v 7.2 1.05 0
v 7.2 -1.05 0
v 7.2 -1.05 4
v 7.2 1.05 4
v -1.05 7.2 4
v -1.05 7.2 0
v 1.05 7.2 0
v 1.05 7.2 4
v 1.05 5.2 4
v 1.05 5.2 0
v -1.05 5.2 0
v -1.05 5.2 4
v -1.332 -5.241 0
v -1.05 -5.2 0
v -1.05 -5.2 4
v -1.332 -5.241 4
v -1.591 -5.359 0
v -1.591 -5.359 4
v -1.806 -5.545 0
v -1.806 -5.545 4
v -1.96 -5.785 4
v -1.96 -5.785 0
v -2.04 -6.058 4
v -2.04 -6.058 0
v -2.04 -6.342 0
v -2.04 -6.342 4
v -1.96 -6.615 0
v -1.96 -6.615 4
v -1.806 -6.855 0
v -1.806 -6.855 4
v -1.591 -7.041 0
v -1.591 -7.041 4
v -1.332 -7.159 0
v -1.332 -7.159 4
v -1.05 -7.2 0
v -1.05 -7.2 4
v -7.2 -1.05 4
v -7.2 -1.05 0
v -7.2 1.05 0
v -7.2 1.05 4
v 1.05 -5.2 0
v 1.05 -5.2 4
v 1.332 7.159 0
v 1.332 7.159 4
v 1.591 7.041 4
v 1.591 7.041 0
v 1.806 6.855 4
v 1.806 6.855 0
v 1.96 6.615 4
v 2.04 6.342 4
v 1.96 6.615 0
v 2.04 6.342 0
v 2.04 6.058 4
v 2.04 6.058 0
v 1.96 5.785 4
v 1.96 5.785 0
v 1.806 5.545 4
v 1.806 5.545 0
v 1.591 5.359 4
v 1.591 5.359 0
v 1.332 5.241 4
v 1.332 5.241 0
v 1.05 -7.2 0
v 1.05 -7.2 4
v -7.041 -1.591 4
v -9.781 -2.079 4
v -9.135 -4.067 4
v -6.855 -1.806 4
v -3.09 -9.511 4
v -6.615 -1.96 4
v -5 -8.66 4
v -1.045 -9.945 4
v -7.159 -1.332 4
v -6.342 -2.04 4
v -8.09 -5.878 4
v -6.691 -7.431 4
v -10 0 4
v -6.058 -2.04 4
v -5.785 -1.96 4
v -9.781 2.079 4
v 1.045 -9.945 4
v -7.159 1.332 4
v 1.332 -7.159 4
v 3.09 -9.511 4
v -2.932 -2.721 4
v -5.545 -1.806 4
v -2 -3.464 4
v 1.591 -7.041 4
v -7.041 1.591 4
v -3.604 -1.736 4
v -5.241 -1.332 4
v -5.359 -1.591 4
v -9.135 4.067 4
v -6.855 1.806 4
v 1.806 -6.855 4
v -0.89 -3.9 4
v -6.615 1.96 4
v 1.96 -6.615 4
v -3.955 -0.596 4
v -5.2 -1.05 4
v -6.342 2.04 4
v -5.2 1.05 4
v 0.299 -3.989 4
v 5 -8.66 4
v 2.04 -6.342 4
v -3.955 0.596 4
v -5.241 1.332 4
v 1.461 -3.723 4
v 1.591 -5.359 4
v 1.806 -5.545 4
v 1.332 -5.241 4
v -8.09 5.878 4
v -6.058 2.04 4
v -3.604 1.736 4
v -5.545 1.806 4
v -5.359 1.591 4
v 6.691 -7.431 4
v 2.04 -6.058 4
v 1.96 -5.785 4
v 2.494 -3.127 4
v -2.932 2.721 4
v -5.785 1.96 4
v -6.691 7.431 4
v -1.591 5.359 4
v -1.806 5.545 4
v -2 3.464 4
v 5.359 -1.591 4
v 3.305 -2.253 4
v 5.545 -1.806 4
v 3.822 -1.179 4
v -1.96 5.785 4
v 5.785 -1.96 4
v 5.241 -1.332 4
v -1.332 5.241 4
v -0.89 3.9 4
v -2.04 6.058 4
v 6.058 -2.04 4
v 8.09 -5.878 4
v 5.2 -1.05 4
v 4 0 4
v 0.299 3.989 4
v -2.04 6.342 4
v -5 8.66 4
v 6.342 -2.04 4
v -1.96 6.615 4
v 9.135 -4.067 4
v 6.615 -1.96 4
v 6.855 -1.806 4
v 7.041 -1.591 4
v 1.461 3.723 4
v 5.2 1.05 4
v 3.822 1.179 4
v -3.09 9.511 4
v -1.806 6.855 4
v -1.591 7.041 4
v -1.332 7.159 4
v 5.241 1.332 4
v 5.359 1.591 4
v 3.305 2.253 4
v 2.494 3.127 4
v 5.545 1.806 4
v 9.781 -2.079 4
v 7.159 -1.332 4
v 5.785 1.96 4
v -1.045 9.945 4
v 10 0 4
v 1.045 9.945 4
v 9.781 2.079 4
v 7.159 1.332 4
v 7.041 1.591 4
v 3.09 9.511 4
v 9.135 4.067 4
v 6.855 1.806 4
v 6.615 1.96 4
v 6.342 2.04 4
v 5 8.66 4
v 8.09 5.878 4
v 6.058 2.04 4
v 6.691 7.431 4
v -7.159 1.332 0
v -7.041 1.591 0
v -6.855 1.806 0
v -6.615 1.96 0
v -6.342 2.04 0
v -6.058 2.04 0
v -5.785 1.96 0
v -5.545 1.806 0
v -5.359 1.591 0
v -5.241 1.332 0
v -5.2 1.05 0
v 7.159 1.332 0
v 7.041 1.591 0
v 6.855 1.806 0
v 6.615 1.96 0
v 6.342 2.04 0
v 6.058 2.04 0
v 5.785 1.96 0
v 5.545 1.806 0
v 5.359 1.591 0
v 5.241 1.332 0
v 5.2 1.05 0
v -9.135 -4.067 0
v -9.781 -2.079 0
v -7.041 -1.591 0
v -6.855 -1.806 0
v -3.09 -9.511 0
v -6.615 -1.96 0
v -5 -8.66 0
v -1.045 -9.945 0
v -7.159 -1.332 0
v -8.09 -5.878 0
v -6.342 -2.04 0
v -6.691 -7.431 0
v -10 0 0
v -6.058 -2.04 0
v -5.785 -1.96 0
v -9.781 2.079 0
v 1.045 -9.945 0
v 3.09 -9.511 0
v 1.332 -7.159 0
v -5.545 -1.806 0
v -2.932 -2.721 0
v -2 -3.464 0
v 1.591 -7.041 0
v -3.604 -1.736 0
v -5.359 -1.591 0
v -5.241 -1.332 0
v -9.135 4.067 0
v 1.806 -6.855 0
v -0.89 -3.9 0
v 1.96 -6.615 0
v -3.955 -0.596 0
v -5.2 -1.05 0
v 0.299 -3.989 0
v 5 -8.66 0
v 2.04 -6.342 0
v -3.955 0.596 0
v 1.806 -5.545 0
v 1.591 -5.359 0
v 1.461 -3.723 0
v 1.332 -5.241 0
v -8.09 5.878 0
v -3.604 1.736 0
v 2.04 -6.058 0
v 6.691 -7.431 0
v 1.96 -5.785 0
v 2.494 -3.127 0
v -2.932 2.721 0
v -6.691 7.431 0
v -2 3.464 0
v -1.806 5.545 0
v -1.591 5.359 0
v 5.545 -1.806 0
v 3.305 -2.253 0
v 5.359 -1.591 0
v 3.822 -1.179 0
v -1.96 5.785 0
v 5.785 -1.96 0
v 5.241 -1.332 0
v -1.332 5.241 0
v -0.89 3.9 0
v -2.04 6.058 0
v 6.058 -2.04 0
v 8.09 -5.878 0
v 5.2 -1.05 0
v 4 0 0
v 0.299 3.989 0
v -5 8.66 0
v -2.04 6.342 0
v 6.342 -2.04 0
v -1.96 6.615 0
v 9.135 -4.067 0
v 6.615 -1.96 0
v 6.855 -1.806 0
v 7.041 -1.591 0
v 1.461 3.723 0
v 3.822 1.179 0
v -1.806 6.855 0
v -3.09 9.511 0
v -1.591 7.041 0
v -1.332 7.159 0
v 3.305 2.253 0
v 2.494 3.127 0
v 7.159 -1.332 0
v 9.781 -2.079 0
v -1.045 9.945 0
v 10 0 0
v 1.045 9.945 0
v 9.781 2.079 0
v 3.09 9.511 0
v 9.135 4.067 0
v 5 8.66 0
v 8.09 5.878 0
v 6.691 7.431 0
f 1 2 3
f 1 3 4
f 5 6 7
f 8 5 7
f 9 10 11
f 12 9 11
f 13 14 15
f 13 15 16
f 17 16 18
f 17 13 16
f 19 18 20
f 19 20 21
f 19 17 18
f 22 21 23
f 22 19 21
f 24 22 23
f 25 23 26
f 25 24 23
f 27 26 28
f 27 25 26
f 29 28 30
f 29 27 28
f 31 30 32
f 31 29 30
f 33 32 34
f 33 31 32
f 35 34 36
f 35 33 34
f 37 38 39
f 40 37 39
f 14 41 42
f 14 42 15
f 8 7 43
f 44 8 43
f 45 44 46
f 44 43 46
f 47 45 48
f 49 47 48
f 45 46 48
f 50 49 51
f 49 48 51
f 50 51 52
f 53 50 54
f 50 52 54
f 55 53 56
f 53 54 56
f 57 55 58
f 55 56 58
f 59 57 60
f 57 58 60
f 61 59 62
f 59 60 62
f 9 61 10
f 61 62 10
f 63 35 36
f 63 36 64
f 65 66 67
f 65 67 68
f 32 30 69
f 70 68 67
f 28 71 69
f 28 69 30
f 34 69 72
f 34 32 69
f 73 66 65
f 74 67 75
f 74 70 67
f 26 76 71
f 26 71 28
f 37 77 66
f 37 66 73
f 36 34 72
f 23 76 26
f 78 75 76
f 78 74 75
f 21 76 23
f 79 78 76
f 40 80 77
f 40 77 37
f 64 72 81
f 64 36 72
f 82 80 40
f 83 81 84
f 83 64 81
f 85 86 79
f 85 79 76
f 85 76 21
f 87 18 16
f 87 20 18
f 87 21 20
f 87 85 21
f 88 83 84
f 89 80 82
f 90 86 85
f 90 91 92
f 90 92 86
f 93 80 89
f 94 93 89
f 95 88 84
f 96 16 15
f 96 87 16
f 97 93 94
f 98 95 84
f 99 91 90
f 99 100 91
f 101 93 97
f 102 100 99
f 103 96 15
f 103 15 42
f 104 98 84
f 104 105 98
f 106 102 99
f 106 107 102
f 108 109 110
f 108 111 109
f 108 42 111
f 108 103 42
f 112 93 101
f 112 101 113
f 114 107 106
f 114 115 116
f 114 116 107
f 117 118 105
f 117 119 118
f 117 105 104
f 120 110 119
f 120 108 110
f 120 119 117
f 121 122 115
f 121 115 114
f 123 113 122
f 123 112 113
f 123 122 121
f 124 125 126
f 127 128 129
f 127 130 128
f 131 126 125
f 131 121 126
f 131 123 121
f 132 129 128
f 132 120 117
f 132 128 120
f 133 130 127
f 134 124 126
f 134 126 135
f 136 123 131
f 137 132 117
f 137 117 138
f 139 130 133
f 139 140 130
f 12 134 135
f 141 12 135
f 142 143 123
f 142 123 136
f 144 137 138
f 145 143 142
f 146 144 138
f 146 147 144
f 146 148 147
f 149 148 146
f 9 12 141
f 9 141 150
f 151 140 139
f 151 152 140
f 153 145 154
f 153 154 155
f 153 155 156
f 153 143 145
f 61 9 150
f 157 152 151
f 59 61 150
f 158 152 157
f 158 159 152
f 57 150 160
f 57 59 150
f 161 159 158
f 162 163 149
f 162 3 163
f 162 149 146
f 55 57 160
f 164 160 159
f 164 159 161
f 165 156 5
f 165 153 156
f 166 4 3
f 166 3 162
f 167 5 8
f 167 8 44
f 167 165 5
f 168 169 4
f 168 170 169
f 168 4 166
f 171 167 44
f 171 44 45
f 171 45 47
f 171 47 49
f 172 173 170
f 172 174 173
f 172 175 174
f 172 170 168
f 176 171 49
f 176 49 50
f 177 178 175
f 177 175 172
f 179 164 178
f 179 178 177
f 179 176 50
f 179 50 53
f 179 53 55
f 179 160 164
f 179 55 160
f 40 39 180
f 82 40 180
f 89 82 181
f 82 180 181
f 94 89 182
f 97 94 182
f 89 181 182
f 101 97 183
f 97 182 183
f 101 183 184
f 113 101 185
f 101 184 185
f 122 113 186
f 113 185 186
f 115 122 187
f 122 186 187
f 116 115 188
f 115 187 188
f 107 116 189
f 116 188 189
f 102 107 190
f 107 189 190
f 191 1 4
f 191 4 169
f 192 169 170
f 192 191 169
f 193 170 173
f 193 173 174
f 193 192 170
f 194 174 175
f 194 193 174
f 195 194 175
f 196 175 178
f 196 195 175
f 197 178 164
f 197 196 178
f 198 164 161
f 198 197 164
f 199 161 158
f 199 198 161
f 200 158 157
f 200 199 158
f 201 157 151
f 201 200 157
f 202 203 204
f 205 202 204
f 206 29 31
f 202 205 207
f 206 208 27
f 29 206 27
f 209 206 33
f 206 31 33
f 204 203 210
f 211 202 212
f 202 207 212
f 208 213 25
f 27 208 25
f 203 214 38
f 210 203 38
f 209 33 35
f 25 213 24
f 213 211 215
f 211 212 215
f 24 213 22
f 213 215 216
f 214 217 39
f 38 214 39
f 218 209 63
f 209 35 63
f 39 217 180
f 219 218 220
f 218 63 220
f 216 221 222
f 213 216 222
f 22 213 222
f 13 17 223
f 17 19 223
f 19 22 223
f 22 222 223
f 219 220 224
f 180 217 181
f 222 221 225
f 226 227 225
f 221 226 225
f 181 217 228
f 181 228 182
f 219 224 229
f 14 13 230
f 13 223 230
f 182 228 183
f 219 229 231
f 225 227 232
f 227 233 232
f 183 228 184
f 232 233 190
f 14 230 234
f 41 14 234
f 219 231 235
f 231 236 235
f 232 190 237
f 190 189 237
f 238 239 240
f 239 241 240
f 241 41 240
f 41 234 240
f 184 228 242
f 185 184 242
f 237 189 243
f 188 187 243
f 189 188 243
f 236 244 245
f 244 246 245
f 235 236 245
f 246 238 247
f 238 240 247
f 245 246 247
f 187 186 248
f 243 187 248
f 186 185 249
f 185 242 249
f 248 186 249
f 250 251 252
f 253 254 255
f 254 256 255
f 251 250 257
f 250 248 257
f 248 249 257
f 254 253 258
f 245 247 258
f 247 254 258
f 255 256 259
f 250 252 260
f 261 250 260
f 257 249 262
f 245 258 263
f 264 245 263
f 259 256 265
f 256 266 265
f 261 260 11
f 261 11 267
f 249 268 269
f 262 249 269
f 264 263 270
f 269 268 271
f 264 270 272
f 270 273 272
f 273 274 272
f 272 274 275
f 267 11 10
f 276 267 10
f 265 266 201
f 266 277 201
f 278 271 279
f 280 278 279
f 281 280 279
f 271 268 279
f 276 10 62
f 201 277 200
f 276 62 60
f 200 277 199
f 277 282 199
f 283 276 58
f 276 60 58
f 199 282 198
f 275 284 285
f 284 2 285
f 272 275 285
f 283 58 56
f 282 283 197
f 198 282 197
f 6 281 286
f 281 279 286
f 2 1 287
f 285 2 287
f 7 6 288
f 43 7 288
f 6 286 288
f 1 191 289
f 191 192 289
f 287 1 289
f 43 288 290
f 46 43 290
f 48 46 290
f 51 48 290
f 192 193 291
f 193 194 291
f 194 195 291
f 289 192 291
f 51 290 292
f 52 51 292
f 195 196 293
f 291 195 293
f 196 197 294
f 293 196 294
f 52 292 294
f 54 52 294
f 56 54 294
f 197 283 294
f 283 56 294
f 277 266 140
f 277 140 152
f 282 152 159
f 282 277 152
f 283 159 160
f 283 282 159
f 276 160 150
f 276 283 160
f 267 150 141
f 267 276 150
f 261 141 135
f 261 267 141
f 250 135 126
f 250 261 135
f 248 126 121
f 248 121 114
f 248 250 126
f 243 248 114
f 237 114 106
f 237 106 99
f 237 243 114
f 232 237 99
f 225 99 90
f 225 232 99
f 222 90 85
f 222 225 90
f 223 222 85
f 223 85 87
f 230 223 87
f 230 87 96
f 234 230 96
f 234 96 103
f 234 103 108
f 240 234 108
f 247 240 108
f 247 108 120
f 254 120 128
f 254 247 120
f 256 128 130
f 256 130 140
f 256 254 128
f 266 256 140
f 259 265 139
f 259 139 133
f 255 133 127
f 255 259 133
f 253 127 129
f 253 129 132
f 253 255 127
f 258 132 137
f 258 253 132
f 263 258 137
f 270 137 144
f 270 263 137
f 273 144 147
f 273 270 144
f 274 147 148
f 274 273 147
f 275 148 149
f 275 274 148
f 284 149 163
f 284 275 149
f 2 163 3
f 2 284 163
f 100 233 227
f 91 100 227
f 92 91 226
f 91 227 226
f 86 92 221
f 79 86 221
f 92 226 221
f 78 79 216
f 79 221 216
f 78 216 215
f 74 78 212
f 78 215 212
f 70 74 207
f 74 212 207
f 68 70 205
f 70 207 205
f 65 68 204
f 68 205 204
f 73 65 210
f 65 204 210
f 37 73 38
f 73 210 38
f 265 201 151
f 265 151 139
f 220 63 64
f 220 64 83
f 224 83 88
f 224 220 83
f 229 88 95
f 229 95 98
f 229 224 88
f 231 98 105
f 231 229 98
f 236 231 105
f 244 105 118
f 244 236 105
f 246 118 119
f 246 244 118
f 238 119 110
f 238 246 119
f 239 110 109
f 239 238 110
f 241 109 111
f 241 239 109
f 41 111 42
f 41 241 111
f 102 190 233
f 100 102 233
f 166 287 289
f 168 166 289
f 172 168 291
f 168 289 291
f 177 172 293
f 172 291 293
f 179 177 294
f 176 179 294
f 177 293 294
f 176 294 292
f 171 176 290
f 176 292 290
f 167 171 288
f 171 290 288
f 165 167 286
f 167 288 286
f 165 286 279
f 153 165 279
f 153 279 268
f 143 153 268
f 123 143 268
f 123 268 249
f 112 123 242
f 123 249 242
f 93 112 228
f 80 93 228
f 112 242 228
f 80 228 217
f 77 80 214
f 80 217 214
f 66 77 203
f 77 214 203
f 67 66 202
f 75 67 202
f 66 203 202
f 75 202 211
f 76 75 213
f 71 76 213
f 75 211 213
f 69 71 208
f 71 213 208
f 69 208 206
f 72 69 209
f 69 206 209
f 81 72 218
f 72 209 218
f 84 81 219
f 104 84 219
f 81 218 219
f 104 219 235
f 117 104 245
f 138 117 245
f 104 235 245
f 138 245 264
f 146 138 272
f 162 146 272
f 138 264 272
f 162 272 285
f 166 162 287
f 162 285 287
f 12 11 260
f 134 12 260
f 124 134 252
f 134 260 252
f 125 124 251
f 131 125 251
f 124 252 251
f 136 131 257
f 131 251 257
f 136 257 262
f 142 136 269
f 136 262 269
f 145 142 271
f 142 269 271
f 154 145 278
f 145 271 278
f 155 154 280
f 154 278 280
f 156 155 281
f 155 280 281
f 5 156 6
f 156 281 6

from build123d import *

# Parameters (mm, degrees)
SKETCH_1_R          = 10
EXTRUDE_1_DEPTH     = 4
SKETCH_2_R          = 4
CUT_EXTRUDE_1_DEPTH = 4


with BuildPart() as part:
    # 草圖1 → 填料-伸長1 (new body)
    with BuildSketch(Plane.XY):
        Circle(SKETCH_1_R)
    extrude(amount=EXTRUDE_1_DEPTH)

    # 草圖2 → 除料-伸長1 (cut)
    with BuildSketch(Plane.XY):
        Circle(SKETCH_2_R)
        with BuildLine():
            Line((-1.05, 7.2), (1.05, 7.2))
            ThreePointArc((1.05, 7.2), (2.05, 6.2), (1.05, 5.2))
            Line((1.05, 5.2), (-1.05, 5.2))
            ThreePointArc((-1.05, 5.2), (-2.05, 6.2), (-1.05, 7.2))
        make_face()
        with BuildLine():
            Line((-5.2, 1.05), (-5.2, -1.05))
            ThreePointArc((-5.2, -1.05), (-6.2, -2.05), (-7.2, -1.05))
            Line((-7.2, -1.05), (-7.2, 1.05))
            ThreePointArc((-7.2, 1.05), (-6.2, 2.05), (-5.2, 1.05))
        make_face()
        with BuildLine():
            Line((5.2, 1.05), (5.2, -1.05))
            ThreePointArc((5.2, -1.05), (6.2, -2.05), (7.2, -1.05))
            Line((7.2, -1.05), (7.2, 1.05))
            ThreePointArc((7.2, 1.05), (6.2, 2.05), (5.2, 1.05))
        make_face()
        with BuildLine():
            Line((-1.05, -7.2), (1.05, -7.2))
            ThreePointArc((1.05, -7.2), (2.05, -6.2), (1.05, -5.2))
            Line((1.05, -5.2), (-1.05, -5.2))
            ThreePointArc((-1.05, -5.2), (-2.05, -6.2), (-1.05, -7.2))
        make_face()
    extrude(amount=CUT_EXTRUDE_1_DEPTH, mode=Mode.SUBTRACT)


solid = part.part
